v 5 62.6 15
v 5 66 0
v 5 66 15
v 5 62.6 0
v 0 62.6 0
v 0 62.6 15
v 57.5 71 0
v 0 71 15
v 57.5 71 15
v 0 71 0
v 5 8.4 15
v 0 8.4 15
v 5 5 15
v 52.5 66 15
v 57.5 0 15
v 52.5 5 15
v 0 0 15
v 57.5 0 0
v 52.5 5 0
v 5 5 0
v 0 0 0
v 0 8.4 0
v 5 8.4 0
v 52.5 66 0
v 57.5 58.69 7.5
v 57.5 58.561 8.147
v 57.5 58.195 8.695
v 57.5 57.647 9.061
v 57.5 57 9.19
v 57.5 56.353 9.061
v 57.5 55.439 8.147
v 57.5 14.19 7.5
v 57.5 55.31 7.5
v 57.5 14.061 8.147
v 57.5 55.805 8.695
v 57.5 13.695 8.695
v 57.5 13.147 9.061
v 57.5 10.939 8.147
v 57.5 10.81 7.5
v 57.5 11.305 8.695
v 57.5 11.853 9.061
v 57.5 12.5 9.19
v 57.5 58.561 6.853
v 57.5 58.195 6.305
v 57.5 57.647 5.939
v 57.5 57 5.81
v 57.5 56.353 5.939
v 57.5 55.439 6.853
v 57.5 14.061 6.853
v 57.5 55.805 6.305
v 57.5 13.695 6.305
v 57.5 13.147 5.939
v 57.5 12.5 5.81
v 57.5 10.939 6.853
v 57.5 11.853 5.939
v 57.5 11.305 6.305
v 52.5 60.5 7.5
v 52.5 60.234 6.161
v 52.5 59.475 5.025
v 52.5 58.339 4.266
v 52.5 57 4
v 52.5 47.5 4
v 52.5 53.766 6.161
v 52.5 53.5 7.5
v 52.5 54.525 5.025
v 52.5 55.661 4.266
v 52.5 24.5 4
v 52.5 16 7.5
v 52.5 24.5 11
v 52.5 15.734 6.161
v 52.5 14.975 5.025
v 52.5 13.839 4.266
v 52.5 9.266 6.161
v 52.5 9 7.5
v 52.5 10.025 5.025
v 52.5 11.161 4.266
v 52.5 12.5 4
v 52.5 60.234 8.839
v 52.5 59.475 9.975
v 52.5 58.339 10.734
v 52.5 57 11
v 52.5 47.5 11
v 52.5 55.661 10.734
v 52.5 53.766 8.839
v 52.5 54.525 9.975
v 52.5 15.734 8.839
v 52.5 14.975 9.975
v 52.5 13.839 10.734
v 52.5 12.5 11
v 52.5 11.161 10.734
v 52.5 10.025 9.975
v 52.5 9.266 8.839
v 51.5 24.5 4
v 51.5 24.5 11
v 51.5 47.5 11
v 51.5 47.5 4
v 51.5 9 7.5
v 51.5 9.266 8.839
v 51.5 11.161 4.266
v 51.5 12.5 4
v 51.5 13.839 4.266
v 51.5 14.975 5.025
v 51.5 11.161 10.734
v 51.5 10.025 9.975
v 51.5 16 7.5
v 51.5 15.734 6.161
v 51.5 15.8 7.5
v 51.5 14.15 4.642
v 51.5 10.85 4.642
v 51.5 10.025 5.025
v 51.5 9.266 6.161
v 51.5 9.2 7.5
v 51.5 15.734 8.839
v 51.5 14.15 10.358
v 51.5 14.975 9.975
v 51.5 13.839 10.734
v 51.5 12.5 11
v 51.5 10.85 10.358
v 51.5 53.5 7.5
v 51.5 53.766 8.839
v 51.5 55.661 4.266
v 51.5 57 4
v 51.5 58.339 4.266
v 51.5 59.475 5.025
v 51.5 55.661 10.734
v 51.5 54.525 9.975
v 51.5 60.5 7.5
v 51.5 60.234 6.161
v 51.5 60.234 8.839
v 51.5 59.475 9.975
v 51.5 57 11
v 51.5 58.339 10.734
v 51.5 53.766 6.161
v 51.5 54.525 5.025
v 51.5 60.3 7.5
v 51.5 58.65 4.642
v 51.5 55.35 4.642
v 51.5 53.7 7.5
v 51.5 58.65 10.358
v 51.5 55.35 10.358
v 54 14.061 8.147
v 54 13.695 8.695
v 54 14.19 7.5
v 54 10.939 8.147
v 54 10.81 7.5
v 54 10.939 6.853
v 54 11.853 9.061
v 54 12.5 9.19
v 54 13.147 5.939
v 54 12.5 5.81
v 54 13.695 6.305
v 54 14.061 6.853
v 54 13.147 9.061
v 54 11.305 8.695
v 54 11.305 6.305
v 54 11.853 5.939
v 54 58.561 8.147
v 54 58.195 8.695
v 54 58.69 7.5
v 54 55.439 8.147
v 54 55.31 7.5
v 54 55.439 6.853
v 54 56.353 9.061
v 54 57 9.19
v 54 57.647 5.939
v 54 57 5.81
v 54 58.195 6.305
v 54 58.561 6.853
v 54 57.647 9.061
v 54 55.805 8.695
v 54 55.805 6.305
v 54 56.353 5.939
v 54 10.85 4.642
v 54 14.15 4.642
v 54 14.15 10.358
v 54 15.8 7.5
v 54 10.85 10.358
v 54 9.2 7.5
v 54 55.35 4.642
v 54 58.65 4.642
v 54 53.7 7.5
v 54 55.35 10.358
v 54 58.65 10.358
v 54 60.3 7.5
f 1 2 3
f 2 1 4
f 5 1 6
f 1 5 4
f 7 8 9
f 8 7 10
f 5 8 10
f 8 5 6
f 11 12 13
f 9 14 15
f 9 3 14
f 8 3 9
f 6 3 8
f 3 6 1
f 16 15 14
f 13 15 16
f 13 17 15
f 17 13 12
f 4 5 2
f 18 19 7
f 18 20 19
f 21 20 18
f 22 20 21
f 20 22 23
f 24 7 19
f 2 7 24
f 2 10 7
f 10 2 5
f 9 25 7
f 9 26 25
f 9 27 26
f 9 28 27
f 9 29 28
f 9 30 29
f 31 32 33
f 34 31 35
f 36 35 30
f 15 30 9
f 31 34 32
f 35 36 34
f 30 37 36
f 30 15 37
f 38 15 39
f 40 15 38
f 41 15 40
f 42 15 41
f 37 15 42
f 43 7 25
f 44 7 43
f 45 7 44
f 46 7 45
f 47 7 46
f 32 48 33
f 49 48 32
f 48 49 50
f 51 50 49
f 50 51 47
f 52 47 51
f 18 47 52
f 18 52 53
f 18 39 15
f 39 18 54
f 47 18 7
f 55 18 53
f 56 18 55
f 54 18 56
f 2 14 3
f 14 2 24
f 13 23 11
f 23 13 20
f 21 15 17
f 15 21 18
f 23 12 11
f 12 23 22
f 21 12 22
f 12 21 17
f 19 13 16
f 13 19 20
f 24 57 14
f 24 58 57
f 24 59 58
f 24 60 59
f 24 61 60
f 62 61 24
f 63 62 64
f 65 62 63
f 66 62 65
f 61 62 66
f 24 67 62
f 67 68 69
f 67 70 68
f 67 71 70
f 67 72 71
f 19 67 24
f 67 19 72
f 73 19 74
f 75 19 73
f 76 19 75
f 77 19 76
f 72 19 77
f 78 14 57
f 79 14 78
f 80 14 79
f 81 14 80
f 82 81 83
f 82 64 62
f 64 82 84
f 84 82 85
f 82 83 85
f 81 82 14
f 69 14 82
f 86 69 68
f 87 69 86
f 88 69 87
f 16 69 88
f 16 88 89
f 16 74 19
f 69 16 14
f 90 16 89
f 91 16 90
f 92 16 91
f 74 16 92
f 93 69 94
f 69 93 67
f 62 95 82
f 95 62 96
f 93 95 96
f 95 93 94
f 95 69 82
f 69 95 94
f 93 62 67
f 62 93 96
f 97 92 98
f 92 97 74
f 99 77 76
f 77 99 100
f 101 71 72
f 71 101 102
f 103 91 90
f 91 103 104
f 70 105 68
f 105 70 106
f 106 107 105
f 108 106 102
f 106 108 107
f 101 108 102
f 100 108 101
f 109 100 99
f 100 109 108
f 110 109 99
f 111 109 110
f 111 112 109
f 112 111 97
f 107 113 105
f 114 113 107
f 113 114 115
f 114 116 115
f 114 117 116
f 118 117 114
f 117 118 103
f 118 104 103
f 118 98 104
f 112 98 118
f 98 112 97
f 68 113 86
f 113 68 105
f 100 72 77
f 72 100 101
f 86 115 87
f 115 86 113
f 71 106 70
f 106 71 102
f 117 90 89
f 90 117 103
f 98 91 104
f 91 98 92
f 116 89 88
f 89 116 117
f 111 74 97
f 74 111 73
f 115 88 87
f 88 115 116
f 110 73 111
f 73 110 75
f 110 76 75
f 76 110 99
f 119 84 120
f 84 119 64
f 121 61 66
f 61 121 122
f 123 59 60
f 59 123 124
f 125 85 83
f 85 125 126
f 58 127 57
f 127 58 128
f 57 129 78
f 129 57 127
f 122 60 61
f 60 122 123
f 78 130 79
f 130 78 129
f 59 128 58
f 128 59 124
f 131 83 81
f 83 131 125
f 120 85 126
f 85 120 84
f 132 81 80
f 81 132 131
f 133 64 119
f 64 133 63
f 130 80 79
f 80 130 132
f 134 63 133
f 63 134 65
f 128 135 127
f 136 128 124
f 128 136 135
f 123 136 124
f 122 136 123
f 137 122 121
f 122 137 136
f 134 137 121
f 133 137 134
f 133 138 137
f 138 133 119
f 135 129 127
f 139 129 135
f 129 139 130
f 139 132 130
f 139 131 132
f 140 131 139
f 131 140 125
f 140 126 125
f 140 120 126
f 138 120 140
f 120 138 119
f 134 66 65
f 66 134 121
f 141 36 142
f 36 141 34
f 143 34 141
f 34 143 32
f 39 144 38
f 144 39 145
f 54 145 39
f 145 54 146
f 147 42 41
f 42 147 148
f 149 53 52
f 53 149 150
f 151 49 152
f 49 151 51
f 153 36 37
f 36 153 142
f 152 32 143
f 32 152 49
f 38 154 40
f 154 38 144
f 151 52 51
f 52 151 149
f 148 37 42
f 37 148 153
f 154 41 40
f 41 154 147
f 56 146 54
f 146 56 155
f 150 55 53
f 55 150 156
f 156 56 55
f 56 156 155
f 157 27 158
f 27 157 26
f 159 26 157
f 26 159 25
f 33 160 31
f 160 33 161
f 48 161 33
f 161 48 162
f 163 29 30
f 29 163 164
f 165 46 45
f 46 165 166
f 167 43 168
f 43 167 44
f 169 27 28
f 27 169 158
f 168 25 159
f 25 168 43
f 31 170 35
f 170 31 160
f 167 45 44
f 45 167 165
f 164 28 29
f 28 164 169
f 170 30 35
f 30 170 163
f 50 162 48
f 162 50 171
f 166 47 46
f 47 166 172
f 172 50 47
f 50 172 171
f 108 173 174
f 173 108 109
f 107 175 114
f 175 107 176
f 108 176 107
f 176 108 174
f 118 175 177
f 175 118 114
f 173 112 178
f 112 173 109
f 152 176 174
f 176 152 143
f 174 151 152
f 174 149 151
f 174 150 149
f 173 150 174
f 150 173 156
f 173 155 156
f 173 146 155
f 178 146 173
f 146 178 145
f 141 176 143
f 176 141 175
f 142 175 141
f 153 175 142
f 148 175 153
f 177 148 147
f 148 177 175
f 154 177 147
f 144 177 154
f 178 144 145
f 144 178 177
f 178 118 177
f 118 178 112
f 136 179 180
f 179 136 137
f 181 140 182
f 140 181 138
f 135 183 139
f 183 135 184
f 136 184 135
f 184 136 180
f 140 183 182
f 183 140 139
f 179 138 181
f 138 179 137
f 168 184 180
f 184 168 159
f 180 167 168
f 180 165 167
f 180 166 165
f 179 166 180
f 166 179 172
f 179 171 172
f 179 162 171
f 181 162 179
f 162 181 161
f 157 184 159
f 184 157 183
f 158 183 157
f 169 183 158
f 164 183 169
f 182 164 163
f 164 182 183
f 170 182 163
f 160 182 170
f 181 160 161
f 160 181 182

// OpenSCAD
/*
Name: OpenSCAD model of a x-axis strain relief bracket
Suits x-axis idlers with offset between leadscrew and straight rod
eg HIC Prusa or MaxMicron Prusa i3 clones 
see Thing: http://www.thingiverse.com/thing:712896

bracket clips over idler end piece and pushes back onto the x-axis rods.

v1.1, Adjustable length for upper and lower arms
v1.2, Mods for customizer support

Author: R Sutherland 

License: CC BY-NC-SA 3.0
License URL: https://creativecommons.org/licenses/by-nc-sa/3.0/
*/

use <MCAD/motors.scad>
use <MCAD/boxes.scad>
use <MCAD/nuts_and_bolts.scad>

$fn=16*1;    

//Upper arm inside length (mm)
Upper_Depth=47.5; //
//Lower arm inside length (mm)
Lower_Depth=47.5; //
//Bracket inside height (mm)
Inside_Height=61.0;  //
//Bracket width (mm)
Width=15.0; // [5:20]
//Bracket thickness (mm)
Thickness=5.0;   //[3.0,4.0,5.0,6.0,7.0]

//metric nut/screw size (Msize)
Nut_Size=3;    //[3,4]
//x-axis straight rod diameter (mm)
Rod_Diameter=8.0;  //[6.0,8.0,10.0]

//Overhang at the end that holds the bracket on (mm)
Lip_Depth=3.4;   //


_dpth=47.5*1; // mm normal inside arm length, don't change,  *1 to stop customizer
_tol=0.2*1;  // mm, tolerance for holes
_delta_upper=_dpth-Upper_Depth;
_delta_lower= _dpth-Lower_Depth;

translate([0,Inside_Height+Thickness+Thickness,0.0])  rotate([90,0,0])  xrelief();

module xrelief (){
    
    difference(){
            
        union(){
//lower arm
            color("red") translate([_delta_upper,0.0,0.0]) cube([Thickness,Width,Thickness+Lip_Depth]);
            color("green") translate([_delta_upper,0.0,0.0]) cube([Thickness+_dpth+Thickness-_delta_upper,Width,Thickness]);

// upper arm
            color("red") translate([_delta_lower,0.0,Thickness+Inside_Height-Lip_Depth]) cube([Thickness,Width,Thickness+Lip_Depth]);
            color("green") translate([_delta_lower,0.0,Thickness+Inside_Height]) cube([Thickness+_dpth+Thickness-_delta_lower,Width,Thickness]);

// riser
            color("blue")  translate([Thickness+_dpth,0.0,0.0]) cube([Thickness,Width,Thickness+Inside_Height+Thickness]);
            translate([_dpth+Thickness,Width/2,18+12+Thickness]) cube([2.0,8.0-1,24.0-1],center=true);
            translate([_dpth+Thickness-1,Width/2,Inside_Height+Thickness-7.5])  rotate([0,90,0]) cylinder(r=3.5,h=3.0);
            translate([_dpth+Thickness-1.0,Width/2,Thickness+9.0]) rotate([0,90,0]) cylinder(r=3.5,h=3.0);
        }

      #  translate([_dpth,Width/2,Inside_Height+Thickness-7.5]) rotate([0,90,0]) boltHole(Nut_Size,length=Thickness*3.0,tolerance=_tol);
      #  translate([_dpth+Thickness-1.0,Width/2,Inside_Height+Thickness-7.5]) rotate([0,90,0]) nutHole(Nut_Size,tolerance=0.1);
      #  translate([_dpth,Width/2,Thickness+9.0]) rotate([0,90,0]) boltHole(Nut_Size,length=Thickness*3,tolerance=_tol);
      #  translate([_dpth+Thickness-1.0,Width/2,Thickness+9.0]) rotate([0,90,0]) nutHole(Nut_Size,tolerance=0.1);

    }

}
